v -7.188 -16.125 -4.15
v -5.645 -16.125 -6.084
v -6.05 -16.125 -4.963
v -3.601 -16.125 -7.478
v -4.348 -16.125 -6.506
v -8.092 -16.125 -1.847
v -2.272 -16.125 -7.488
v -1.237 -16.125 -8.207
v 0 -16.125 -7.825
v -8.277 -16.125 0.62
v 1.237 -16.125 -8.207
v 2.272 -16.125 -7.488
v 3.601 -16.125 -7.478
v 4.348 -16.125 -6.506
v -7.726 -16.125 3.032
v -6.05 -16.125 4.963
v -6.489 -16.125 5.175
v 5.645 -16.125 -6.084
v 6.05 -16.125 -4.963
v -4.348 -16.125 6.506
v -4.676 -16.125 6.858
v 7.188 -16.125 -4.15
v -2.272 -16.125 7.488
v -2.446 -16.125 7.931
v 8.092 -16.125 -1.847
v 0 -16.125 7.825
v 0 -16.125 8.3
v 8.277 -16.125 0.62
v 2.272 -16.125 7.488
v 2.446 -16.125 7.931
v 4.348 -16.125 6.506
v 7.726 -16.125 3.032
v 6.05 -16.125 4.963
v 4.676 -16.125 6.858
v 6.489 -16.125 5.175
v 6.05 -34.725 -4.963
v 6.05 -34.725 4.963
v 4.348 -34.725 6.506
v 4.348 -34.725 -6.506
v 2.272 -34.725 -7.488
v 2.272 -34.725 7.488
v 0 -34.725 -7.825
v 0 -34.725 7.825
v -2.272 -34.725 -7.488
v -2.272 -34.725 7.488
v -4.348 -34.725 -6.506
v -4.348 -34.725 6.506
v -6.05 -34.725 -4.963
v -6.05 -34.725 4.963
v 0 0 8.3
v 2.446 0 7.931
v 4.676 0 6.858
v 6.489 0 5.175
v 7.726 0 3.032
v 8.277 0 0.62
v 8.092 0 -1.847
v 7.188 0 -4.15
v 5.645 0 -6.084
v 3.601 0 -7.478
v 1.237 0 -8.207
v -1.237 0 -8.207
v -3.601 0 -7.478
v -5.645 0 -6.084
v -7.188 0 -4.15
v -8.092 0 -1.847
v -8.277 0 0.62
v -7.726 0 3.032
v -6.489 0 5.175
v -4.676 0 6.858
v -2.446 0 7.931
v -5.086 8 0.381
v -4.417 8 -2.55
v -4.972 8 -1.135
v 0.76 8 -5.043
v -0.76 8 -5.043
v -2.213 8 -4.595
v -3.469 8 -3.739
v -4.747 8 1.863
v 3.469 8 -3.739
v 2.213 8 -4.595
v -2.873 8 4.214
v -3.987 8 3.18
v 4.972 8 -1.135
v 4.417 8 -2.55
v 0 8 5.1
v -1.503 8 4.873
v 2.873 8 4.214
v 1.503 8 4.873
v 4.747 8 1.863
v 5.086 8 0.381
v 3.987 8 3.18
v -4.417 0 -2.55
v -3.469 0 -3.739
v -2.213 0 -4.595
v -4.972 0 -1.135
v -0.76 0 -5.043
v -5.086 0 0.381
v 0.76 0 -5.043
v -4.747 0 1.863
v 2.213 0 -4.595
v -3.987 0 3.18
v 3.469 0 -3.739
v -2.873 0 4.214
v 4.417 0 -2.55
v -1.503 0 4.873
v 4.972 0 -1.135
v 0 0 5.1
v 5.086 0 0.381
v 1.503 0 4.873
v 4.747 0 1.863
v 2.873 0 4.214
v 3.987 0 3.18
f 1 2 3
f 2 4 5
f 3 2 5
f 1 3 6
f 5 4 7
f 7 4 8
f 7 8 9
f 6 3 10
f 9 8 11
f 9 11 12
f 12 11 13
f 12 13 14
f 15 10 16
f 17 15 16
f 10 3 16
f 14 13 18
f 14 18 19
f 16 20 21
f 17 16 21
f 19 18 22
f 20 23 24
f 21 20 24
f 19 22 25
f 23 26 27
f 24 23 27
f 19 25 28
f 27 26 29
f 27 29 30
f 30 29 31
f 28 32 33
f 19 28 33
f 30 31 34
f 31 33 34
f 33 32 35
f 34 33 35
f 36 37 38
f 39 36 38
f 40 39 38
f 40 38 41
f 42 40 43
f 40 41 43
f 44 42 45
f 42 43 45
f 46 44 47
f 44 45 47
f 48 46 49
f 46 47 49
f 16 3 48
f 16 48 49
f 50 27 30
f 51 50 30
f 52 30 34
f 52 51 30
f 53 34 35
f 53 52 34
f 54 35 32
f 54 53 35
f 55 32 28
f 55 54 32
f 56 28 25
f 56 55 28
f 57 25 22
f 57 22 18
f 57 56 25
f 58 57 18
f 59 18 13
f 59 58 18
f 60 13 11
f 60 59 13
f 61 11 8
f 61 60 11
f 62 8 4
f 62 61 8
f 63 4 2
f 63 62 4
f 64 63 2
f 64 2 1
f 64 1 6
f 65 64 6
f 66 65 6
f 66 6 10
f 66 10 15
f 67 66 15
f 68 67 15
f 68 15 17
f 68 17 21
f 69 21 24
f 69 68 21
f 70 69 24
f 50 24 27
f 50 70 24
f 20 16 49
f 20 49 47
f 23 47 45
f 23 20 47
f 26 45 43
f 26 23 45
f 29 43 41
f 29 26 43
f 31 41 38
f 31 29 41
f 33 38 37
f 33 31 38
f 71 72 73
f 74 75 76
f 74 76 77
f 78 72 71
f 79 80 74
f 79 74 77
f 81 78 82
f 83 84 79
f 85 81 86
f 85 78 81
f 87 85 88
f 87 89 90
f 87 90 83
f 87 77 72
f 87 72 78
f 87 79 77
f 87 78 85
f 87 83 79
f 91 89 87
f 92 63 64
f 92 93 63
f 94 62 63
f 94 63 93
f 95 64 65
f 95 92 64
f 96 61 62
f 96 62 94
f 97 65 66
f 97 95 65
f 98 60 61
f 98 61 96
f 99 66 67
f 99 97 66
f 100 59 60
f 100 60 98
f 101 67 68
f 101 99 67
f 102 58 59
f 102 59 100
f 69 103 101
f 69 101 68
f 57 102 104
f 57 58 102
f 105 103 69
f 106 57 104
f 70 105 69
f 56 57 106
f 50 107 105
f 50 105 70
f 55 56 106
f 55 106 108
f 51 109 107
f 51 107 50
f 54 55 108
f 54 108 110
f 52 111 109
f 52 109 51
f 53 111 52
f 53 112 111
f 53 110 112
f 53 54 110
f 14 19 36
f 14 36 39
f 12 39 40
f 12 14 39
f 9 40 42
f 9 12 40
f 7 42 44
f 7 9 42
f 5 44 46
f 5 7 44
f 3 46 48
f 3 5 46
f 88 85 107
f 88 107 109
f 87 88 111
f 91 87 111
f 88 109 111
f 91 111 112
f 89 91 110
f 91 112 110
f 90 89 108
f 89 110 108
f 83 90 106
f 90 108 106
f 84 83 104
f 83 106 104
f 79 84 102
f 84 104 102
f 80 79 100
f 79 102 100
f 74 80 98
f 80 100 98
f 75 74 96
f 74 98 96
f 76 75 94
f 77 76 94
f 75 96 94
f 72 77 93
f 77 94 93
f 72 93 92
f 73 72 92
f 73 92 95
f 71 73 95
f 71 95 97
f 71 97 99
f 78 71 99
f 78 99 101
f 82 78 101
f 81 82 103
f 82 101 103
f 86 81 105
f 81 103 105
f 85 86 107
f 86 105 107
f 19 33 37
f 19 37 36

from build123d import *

# Parameters (mm, degrees)
SKETCH1_R           = 8.3
BOSS_EXTRUDE1_DEPTH = 16.125
SKETCH2_R           = 5.1
BOSS_EXTRUDE2_DEPTH = 8
BOSS_EXTRUDE3_DEPTH = 18.6


with BuildPart() as part:
    # Sketch1 → Boss-Extrude1 (new body)
    with BuildSketch(Plane(origin=(0, 0, 0), x_dir=(1, 0, 0), z_dir=(0, 1, 0))):
        with Locations(Location((0, 0, 0), (0, 0, 270))):
            Circle(SKETCH1_R)
    extrude(amount=-BOSS_EXTRUDE1_DEPTH)

    # Sketch2 → Boss-Extrude2 (add)
    with BuildSketch(Plane(origin=(0, 0, 0), x_dir=(1, 0, 0), z_dir=(0, 1, 0))):
        with Locations(Location((0, 0, 0), (0, 0, 270))):
            Circle(SKETCH2_R)
    extrude(amount=BOSS_EXTRUDE2_DEPTH)

    # Sketch3 → Boss-Extrude3 (add)
    with BuildSketch(Plane.XZ.offset(16.125)):
        with BuildLine():
            Line((-6.05, -4.962673171), (-6.05, 4.962673171))
            ThreePointArc((-6.05, 4.962673171), (0, 7.825), (6.05, 4.962673171))
            Line((6.05, 4.962673171), (6.05, -4.962673171))
            ThreePointArc((6.05, -4.962673171), (0, -7.825), (-6.05, -4.962673171))
        make_face()
    extrude(amount=BOSS_EXTRUDE3_DEPTH)


solid = part.part
